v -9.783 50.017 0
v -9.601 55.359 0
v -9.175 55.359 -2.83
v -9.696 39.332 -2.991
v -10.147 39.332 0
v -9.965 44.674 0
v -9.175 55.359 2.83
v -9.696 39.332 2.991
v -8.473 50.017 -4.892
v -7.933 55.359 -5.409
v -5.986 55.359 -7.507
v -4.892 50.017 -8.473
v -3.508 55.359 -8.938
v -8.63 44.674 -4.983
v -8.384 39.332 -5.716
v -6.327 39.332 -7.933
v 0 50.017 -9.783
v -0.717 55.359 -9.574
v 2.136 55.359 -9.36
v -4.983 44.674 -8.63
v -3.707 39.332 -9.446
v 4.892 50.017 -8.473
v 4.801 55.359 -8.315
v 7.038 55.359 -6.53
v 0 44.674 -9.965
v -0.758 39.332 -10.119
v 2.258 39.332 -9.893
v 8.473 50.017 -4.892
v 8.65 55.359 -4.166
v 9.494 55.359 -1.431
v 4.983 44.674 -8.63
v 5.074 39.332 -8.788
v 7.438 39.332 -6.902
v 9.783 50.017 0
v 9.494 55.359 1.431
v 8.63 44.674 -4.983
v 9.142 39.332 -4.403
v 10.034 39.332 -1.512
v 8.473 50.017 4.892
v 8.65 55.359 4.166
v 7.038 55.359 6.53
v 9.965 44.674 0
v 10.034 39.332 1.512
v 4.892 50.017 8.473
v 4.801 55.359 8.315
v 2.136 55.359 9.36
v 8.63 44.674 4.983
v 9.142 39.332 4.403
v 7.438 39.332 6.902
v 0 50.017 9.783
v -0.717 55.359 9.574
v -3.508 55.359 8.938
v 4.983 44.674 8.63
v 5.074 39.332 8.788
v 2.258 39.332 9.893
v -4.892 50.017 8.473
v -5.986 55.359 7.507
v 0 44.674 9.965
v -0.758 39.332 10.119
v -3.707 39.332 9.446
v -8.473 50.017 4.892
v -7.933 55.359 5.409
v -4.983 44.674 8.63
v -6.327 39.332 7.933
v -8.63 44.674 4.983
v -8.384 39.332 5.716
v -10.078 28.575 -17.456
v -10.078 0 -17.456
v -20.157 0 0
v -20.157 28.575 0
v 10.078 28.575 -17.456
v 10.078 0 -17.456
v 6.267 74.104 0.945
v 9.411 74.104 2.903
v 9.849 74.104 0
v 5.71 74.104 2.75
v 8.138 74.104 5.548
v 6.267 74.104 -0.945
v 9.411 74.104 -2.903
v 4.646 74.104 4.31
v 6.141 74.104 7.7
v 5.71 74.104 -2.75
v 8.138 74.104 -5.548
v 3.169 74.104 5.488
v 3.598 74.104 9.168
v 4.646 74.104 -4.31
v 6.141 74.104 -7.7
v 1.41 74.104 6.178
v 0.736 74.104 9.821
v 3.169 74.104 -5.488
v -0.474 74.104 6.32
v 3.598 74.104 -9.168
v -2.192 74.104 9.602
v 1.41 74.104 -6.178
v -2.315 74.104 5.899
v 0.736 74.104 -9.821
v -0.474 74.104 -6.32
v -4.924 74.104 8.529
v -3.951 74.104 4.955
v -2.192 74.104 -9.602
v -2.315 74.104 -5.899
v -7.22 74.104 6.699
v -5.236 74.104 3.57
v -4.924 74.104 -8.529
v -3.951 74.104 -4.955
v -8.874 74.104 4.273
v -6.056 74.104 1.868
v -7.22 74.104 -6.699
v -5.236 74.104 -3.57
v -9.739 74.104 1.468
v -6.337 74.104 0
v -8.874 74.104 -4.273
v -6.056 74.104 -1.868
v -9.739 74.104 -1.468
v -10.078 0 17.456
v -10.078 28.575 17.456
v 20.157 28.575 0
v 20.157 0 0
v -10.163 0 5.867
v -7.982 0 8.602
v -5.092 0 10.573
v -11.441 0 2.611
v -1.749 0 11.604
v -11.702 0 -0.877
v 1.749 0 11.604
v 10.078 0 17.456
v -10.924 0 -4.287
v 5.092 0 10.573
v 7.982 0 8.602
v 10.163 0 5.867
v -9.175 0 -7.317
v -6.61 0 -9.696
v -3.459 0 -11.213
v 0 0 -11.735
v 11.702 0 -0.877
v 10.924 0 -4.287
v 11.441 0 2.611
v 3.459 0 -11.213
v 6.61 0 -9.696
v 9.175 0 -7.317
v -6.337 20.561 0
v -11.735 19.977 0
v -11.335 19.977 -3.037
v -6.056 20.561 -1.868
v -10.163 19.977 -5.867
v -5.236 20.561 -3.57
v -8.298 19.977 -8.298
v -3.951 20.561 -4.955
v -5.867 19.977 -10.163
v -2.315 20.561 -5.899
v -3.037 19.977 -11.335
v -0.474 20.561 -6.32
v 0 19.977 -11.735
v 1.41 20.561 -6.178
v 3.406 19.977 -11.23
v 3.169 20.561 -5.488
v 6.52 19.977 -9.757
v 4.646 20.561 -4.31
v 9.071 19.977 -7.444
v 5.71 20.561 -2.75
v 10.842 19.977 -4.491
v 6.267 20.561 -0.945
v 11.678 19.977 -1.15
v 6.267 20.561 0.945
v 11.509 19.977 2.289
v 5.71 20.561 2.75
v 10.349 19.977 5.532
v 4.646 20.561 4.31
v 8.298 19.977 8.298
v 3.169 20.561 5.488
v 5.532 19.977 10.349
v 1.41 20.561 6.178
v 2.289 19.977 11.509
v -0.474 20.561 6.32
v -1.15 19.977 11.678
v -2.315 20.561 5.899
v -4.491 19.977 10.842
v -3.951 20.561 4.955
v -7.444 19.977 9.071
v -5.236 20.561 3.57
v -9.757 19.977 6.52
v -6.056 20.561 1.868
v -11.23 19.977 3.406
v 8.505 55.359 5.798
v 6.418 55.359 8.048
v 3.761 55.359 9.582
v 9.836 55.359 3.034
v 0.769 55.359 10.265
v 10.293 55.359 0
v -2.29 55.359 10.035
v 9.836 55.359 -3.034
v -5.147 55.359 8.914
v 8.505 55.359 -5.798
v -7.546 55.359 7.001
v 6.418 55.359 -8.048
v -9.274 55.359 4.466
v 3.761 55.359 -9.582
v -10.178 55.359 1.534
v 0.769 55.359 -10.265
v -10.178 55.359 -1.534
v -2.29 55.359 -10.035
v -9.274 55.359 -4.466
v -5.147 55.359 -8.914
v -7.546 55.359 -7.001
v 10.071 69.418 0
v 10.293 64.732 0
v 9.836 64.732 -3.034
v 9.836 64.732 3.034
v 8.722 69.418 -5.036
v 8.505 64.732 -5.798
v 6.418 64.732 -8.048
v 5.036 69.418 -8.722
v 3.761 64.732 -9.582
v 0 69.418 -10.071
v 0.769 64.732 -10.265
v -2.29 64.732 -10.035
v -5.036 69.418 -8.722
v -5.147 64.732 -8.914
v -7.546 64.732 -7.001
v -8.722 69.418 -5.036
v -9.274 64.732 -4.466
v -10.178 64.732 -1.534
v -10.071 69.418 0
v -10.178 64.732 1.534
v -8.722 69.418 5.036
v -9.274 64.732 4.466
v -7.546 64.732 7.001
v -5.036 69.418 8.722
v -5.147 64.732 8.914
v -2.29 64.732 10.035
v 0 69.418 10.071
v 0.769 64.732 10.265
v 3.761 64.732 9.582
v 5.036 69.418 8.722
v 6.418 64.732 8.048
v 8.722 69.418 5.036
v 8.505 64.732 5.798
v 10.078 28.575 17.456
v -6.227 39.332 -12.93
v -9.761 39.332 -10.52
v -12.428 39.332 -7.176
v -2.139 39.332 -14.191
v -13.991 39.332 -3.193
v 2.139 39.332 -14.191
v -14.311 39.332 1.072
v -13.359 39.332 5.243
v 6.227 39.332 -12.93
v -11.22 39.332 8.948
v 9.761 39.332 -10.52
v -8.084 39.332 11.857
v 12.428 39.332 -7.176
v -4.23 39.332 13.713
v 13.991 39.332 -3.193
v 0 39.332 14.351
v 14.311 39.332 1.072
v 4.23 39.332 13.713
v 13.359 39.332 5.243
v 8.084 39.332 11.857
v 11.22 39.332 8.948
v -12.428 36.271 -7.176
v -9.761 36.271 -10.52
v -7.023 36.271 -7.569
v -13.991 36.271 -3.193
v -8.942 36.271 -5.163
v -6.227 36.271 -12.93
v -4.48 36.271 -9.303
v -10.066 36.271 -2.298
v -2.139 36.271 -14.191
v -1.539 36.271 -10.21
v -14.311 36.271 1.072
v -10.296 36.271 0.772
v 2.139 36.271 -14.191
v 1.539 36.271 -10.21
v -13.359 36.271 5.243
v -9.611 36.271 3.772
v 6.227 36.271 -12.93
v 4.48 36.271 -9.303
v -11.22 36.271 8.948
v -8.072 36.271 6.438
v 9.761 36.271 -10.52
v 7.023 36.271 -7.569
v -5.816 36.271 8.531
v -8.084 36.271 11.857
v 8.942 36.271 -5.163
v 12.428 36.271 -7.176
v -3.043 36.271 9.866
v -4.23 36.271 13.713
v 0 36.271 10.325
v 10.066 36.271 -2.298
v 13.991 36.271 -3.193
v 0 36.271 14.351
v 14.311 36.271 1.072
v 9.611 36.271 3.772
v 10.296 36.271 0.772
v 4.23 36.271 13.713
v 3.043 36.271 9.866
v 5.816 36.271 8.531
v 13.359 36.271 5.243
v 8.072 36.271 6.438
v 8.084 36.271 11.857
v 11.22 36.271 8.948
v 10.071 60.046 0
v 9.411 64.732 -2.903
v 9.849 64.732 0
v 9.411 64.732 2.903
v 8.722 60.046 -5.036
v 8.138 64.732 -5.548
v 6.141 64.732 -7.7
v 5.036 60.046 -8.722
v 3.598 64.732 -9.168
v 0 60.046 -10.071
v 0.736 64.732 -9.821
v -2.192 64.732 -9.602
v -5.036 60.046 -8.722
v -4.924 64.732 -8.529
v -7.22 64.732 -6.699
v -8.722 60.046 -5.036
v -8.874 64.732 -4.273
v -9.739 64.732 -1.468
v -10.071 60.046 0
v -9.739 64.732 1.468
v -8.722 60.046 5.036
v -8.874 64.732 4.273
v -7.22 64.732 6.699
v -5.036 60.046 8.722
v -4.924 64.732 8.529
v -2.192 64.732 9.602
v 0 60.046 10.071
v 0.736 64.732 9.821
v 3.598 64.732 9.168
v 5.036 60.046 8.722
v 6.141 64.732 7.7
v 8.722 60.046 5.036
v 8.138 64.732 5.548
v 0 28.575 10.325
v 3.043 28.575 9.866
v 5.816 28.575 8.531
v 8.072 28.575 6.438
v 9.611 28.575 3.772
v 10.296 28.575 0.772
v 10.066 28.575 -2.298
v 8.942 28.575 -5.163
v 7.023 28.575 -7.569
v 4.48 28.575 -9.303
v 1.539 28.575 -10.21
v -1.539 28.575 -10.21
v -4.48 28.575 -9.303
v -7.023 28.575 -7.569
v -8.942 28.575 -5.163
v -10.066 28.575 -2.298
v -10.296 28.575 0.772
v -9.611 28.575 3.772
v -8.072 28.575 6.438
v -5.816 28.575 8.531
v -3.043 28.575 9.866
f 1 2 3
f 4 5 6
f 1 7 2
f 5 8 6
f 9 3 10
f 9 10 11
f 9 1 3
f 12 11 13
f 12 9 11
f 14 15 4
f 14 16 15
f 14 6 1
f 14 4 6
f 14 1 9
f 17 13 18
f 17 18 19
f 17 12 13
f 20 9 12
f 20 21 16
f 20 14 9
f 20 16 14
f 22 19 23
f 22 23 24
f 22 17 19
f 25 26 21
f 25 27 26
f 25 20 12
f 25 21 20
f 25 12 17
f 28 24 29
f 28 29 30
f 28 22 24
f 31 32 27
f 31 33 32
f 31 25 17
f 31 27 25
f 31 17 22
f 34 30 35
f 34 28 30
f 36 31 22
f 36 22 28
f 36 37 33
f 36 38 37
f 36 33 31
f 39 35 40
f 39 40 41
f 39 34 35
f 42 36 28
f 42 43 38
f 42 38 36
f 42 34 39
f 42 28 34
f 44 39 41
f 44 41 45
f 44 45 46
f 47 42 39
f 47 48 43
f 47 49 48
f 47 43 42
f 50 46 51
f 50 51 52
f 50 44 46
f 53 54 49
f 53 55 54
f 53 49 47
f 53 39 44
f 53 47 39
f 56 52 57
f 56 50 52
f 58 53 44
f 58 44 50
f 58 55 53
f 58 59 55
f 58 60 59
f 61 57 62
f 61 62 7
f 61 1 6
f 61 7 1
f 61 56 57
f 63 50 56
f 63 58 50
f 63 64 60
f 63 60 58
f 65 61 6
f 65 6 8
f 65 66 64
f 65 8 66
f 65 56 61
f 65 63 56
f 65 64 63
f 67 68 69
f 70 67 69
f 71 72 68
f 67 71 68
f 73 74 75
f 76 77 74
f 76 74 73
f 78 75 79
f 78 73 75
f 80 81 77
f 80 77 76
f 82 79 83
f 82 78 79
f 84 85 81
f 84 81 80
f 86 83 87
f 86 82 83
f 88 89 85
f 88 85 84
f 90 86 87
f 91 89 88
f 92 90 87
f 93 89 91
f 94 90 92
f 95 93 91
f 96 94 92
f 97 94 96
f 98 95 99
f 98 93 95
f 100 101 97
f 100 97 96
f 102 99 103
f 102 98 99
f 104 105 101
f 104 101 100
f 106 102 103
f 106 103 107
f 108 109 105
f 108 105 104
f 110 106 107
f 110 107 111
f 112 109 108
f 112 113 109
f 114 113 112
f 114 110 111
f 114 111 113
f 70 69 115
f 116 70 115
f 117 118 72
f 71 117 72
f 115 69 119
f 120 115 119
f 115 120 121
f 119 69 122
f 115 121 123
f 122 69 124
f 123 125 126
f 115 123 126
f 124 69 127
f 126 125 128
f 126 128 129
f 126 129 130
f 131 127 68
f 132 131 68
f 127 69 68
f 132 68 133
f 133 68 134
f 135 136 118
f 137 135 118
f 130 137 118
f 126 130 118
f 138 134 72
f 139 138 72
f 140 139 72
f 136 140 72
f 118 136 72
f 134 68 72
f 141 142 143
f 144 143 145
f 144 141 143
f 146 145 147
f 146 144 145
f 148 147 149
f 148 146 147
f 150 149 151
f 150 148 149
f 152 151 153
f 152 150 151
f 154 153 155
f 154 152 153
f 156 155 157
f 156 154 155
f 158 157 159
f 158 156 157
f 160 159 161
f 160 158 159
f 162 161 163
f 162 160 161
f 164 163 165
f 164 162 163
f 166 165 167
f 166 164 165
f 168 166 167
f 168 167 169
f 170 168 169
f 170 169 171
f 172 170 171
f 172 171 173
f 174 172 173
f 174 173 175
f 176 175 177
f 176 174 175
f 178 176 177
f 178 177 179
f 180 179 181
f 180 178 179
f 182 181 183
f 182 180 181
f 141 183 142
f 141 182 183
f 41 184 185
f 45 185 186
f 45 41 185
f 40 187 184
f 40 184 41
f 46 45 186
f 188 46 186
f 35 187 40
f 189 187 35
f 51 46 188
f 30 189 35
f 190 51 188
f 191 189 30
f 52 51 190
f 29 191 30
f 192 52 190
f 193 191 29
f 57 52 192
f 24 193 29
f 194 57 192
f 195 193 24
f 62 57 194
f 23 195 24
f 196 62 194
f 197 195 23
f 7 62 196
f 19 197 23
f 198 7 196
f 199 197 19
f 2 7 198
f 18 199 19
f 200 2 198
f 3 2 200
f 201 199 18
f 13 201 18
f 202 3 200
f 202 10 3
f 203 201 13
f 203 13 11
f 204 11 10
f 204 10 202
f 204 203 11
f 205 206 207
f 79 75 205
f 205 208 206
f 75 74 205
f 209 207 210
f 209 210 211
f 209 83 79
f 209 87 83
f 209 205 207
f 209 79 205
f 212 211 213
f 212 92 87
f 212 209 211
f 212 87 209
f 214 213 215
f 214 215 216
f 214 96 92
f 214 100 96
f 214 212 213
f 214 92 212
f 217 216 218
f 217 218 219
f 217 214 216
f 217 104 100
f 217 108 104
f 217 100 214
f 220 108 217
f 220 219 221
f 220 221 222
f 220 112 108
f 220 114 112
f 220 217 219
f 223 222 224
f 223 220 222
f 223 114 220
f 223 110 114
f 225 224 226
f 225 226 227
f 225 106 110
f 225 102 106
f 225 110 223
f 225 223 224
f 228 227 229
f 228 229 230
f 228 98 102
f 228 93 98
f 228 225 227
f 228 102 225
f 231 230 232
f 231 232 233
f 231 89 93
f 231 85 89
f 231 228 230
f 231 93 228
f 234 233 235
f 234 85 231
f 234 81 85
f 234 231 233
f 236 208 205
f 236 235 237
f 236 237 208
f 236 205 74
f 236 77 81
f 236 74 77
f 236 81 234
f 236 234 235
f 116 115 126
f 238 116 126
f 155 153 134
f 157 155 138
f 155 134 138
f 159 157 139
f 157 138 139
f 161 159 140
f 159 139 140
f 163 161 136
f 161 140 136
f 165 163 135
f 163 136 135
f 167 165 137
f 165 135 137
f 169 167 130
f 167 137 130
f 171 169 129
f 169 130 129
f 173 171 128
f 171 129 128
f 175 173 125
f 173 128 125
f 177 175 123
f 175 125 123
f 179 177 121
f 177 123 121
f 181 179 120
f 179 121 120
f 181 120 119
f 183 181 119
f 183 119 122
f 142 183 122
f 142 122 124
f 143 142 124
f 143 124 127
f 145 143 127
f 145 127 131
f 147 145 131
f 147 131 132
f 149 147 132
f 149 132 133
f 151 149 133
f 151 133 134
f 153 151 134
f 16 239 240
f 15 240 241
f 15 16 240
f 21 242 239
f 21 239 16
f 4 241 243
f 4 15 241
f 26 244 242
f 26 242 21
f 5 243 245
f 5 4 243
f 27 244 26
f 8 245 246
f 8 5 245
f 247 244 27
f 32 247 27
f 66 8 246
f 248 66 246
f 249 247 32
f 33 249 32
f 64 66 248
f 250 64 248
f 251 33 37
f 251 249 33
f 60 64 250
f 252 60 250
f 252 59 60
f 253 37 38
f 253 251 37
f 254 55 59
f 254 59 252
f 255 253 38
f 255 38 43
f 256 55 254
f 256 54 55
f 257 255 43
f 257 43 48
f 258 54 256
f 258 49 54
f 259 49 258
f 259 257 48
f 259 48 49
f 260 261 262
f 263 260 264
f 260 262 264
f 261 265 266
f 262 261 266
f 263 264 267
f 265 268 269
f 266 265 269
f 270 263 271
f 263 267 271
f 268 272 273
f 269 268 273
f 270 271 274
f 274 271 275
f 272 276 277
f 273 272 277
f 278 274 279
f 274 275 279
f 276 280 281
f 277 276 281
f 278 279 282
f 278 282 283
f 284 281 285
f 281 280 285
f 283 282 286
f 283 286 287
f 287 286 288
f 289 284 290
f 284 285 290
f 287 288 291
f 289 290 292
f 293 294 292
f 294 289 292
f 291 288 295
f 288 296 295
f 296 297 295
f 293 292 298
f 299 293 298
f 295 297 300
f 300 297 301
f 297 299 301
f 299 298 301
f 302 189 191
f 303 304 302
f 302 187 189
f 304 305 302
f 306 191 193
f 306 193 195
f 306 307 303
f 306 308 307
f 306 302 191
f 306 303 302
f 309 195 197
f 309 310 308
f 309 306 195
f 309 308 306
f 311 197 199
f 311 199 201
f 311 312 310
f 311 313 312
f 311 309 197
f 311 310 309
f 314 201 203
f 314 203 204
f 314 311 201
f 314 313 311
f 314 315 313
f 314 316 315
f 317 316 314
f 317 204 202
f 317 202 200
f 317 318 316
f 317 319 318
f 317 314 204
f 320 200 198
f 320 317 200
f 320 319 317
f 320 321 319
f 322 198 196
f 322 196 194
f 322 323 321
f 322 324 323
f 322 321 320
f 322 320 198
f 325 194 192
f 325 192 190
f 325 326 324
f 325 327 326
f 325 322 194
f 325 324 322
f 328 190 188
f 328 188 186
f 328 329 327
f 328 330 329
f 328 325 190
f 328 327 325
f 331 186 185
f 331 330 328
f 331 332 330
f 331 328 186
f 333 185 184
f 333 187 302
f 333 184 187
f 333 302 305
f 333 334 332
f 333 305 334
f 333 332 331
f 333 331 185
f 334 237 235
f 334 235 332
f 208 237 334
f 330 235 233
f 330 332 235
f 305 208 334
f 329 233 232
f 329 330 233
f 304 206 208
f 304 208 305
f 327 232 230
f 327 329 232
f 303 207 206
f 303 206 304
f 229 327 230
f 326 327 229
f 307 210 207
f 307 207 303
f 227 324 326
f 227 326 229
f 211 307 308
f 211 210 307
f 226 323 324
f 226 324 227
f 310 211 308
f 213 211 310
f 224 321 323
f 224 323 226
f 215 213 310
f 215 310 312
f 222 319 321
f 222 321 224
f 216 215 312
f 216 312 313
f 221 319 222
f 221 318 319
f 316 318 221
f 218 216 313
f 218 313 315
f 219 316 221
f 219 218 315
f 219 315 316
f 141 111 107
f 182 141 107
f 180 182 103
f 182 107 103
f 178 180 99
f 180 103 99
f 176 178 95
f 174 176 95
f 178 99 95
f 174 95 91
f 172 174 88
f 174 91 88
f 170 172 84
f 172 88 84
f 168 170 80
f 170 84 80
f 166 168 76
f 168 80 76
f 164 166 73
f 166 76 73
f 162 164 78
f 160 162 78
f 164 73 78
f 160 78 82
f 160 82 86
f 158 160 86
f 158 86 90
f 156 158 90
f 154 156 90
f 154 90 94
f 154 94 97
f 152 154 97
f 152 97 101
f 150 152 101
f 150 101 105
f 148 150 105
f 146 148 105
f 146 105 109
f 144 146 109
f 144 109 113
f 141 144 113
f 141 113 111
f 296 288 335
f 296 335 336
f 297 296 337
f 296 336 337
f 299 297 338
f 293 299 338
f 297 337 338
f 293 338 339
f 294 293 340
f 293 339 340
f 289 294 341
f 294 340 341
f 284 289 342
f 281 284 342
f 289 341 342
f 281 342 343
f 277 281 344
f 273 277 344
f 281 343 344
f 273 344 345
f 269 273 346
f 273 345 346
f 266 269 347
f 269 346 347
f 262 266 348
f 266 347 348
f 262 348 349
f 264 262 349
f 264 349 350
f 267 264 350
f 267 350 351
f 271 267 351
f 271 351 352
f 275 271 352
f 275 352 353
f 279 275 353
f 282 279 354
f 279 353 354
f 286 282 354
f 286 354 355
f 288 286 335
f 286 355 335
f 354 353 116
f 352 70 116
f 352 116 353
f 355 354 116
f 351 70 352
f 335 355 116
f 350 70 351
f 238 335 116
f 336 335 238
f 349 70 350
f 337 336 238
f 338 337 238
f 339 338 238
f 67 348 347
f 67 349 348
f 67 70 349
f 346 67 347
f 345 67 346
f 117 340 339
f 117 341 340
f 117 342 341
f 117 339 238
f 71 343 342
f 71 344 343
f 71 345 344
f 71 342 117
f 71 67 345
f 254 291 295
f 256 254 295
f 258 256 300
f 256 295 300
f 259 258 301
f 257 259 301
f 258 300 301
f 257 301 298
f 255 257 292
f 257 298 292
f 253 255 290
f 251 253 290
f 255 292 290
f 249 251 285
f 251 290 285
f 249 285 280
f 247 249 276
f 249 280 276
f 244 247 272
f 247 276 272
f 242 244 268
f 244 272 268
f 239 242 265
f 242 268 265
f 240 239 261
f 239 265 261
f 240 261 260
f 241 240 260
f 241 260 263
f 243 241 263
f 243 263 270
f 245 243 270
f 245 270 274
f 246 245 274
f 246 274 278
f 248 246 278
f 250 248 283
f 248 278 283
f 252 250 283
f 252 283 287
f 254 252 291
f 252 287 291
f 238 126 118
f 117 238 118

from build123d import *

# Parameters (mm, degrees)
BOSS_EXTRUDE1_DEPTH     = 28.575
SKETCH2_R               = 10.3251
BOSS_EXTRUDE2_DEPTH     = 7.6962
SKETCH3_R               = 14.351
BOSS_EXTRUDE3_DEPTH     = 3.0607
SKETCH6_R               = 11.7348
CUT_EXTRUDE1_DEPTH      = 19.9771
SKETCH7_R               = 6.3373
CUT_EXTRUDE2_DEPTH      = 72.2884
CUT_EXTRUDE3_DEPTH      = 103.717779464
CUT_EXTRUDE3_DEPTH_BACK = 103.717779464
SKETCH15_W              = 20.5867
SKETCH15_H              = 9.3726
SKETCH15_H_2            = 16.0274


with BuildPart() as part:
    # Sketch1 → Boss-Extrude1 (new body)
    with BuildSketch(Plane(origin=(0, 0, 0), x_dir=(1, 0, 0), z_dir=(0, 1, 0))):
        Polygon((10.078312902, 17.45615), (-10.078312902, 17.45615), (-20.156625803, 0), (-10.078312902, -17.45615), (10.078312902, -17.45615), (20.156625803, 0), align=None)
    extrude(amount=BOSS_EXTRUDE1_DEPTH)

    # Sketch2 → Boss-Extrude2 (add)
    with BuildSketch(Plane(origin=(0, 28.575, 0), x_dir=(1, 0, 0), z_dir=(0, 1, 0))):
        with Locations(Location((0, 0, 0), (0, 0, 270))):
            Circle(SKETCH2_R)
    extrude(amount=BOSS_EXTRUDE2_DEPTH)

    # Sketch3 → Boss-Extrude3 (add)
    with BuildSketch(Plane(origin=(0, 36.2712, 0), x_dir=(1, 0, 0), z_dir=(0, 1, 0))):
        with Locations(Location((0, 0, 0), (0, 0, 270))):
            Circle(SKETCH3_R)
    extrude(amount=BOSS_EXTRUDE3_DEPTH)

    # Sketch4 → Revolve2 (revolve)
    with BuildSketch(Plane.XY, mode=Mode.PRIVATE) as revolve2_sk:
        Polygon((0, 55.3593), (9.6012, 55.3593), (10.1473, 39.3319), (0, 39.3319), align=None)
    revolve(revolve2_sk.sketch.rotate(Axis((0, 55.3593, 0), (0, -1, 0)), 180), axis=Axis((0, 55.3593, 0), (0, -1, 0)))

    # Sketch5 → Revolve3 (revolve)
    with BuildSketch(Plane.XY):
        Polygon((0, 55.3593), (10.29335, 55.3593), (9.84885, 64.7319), (0, 64.7319), align=None)
        Polygon((0, 74.1045), (0, 64.7319), (9.84885, 64.7319), (10.29335, 64.7319), (9.84885, 74.1045), align=None)
        Polygon((0, 83.4771), (0, 74.1045), (9.84885, 74.1045), (10.29335, 74.1045), (9.84885, 83.4771), align=None)
        Polygon((0, 92.8497), (0, 83.4771), (9.84885, 83.4771), (10.29335, 83.4771), (9.84885, 92.8497), align=None)
    revolve(axis=Axis((0, 55.3593, 0), (0, 1, 0)))

    # Sketch6 → Cut-Extrude1 (cut)
    with BuildSketch(Plane(origin=(0, 0, 0), x_dir=(-1, 0, 0), z_dir=(0, -1, 0))):
        with Locations(Location((0, 0, 0), (0, 0, 90))):
            Circle(SKETCH6_R)
    extrude(amount=-CUT_EXTRUDE1_DEPTH, mode=Mode.SUBTRACT)

    # Sketch7 → Cut-Extrude2 (cut)
    with BuildSketch(Plane(origin=(0, 92.8497, 0), x_dir=(1, 0, 0), z_dir=(0, 1, 0))):
        with Locations(Location((0, 0, 0), (0, 0, 180))):
            Circle(SKETCH7_R)
    extrude(amount=-CUT_EXTRUDE2_DEPTH, mode=Mode.SUBTRACT)

    # Sketch14 → Cut-Revolve1 (revolve, cut)
    with BuildSketch(Plane.XY, mode=Mode.PRIVATE) as cut_revolve1_sk:
        Polygon((6.3373, 20.5613), (0, 20.5613), (0, 19.9771), (11.7348, 19.9771), align=None)
    revolve(cut_revolve1_sk.sketch.rotate(Axis((0, 20.5613, 0), (0, -1, 0)), 180), axis=Axis((0, 20.5613, 0), (0, -1, 0)), mode=Mode.SUBTRACT)

    # Sketch15 → Cut-Extrude3 (cut, two sides: drawn at the far end of the back side and taken through both)
    with BuildSketch(Plane(origin=(15.117469352, 0, -8.728075), x_dir=(-0.4999999999999997, 0, -0.8660254037844388), z_dir=(0.8660254037844389, 0, -0.49999999999999983)).offset(-CUT_EXTRUDE3_DEPTH_BACK)):
        with Locations((0, 78.7908)):
            Rectangle(SKETCH15_W, SKETCH15_H)
        with Locations((0, 91.4908)):
            Rectangle(SKETCH15_W, SKETCH15_H_2)
    extrude(amount=CUT_EXTRUDE3_DEPTH + CUT_EXTRUDE3_DEPTH_BACK, mode=Mode.SUBTRACT)


solid = part.part
